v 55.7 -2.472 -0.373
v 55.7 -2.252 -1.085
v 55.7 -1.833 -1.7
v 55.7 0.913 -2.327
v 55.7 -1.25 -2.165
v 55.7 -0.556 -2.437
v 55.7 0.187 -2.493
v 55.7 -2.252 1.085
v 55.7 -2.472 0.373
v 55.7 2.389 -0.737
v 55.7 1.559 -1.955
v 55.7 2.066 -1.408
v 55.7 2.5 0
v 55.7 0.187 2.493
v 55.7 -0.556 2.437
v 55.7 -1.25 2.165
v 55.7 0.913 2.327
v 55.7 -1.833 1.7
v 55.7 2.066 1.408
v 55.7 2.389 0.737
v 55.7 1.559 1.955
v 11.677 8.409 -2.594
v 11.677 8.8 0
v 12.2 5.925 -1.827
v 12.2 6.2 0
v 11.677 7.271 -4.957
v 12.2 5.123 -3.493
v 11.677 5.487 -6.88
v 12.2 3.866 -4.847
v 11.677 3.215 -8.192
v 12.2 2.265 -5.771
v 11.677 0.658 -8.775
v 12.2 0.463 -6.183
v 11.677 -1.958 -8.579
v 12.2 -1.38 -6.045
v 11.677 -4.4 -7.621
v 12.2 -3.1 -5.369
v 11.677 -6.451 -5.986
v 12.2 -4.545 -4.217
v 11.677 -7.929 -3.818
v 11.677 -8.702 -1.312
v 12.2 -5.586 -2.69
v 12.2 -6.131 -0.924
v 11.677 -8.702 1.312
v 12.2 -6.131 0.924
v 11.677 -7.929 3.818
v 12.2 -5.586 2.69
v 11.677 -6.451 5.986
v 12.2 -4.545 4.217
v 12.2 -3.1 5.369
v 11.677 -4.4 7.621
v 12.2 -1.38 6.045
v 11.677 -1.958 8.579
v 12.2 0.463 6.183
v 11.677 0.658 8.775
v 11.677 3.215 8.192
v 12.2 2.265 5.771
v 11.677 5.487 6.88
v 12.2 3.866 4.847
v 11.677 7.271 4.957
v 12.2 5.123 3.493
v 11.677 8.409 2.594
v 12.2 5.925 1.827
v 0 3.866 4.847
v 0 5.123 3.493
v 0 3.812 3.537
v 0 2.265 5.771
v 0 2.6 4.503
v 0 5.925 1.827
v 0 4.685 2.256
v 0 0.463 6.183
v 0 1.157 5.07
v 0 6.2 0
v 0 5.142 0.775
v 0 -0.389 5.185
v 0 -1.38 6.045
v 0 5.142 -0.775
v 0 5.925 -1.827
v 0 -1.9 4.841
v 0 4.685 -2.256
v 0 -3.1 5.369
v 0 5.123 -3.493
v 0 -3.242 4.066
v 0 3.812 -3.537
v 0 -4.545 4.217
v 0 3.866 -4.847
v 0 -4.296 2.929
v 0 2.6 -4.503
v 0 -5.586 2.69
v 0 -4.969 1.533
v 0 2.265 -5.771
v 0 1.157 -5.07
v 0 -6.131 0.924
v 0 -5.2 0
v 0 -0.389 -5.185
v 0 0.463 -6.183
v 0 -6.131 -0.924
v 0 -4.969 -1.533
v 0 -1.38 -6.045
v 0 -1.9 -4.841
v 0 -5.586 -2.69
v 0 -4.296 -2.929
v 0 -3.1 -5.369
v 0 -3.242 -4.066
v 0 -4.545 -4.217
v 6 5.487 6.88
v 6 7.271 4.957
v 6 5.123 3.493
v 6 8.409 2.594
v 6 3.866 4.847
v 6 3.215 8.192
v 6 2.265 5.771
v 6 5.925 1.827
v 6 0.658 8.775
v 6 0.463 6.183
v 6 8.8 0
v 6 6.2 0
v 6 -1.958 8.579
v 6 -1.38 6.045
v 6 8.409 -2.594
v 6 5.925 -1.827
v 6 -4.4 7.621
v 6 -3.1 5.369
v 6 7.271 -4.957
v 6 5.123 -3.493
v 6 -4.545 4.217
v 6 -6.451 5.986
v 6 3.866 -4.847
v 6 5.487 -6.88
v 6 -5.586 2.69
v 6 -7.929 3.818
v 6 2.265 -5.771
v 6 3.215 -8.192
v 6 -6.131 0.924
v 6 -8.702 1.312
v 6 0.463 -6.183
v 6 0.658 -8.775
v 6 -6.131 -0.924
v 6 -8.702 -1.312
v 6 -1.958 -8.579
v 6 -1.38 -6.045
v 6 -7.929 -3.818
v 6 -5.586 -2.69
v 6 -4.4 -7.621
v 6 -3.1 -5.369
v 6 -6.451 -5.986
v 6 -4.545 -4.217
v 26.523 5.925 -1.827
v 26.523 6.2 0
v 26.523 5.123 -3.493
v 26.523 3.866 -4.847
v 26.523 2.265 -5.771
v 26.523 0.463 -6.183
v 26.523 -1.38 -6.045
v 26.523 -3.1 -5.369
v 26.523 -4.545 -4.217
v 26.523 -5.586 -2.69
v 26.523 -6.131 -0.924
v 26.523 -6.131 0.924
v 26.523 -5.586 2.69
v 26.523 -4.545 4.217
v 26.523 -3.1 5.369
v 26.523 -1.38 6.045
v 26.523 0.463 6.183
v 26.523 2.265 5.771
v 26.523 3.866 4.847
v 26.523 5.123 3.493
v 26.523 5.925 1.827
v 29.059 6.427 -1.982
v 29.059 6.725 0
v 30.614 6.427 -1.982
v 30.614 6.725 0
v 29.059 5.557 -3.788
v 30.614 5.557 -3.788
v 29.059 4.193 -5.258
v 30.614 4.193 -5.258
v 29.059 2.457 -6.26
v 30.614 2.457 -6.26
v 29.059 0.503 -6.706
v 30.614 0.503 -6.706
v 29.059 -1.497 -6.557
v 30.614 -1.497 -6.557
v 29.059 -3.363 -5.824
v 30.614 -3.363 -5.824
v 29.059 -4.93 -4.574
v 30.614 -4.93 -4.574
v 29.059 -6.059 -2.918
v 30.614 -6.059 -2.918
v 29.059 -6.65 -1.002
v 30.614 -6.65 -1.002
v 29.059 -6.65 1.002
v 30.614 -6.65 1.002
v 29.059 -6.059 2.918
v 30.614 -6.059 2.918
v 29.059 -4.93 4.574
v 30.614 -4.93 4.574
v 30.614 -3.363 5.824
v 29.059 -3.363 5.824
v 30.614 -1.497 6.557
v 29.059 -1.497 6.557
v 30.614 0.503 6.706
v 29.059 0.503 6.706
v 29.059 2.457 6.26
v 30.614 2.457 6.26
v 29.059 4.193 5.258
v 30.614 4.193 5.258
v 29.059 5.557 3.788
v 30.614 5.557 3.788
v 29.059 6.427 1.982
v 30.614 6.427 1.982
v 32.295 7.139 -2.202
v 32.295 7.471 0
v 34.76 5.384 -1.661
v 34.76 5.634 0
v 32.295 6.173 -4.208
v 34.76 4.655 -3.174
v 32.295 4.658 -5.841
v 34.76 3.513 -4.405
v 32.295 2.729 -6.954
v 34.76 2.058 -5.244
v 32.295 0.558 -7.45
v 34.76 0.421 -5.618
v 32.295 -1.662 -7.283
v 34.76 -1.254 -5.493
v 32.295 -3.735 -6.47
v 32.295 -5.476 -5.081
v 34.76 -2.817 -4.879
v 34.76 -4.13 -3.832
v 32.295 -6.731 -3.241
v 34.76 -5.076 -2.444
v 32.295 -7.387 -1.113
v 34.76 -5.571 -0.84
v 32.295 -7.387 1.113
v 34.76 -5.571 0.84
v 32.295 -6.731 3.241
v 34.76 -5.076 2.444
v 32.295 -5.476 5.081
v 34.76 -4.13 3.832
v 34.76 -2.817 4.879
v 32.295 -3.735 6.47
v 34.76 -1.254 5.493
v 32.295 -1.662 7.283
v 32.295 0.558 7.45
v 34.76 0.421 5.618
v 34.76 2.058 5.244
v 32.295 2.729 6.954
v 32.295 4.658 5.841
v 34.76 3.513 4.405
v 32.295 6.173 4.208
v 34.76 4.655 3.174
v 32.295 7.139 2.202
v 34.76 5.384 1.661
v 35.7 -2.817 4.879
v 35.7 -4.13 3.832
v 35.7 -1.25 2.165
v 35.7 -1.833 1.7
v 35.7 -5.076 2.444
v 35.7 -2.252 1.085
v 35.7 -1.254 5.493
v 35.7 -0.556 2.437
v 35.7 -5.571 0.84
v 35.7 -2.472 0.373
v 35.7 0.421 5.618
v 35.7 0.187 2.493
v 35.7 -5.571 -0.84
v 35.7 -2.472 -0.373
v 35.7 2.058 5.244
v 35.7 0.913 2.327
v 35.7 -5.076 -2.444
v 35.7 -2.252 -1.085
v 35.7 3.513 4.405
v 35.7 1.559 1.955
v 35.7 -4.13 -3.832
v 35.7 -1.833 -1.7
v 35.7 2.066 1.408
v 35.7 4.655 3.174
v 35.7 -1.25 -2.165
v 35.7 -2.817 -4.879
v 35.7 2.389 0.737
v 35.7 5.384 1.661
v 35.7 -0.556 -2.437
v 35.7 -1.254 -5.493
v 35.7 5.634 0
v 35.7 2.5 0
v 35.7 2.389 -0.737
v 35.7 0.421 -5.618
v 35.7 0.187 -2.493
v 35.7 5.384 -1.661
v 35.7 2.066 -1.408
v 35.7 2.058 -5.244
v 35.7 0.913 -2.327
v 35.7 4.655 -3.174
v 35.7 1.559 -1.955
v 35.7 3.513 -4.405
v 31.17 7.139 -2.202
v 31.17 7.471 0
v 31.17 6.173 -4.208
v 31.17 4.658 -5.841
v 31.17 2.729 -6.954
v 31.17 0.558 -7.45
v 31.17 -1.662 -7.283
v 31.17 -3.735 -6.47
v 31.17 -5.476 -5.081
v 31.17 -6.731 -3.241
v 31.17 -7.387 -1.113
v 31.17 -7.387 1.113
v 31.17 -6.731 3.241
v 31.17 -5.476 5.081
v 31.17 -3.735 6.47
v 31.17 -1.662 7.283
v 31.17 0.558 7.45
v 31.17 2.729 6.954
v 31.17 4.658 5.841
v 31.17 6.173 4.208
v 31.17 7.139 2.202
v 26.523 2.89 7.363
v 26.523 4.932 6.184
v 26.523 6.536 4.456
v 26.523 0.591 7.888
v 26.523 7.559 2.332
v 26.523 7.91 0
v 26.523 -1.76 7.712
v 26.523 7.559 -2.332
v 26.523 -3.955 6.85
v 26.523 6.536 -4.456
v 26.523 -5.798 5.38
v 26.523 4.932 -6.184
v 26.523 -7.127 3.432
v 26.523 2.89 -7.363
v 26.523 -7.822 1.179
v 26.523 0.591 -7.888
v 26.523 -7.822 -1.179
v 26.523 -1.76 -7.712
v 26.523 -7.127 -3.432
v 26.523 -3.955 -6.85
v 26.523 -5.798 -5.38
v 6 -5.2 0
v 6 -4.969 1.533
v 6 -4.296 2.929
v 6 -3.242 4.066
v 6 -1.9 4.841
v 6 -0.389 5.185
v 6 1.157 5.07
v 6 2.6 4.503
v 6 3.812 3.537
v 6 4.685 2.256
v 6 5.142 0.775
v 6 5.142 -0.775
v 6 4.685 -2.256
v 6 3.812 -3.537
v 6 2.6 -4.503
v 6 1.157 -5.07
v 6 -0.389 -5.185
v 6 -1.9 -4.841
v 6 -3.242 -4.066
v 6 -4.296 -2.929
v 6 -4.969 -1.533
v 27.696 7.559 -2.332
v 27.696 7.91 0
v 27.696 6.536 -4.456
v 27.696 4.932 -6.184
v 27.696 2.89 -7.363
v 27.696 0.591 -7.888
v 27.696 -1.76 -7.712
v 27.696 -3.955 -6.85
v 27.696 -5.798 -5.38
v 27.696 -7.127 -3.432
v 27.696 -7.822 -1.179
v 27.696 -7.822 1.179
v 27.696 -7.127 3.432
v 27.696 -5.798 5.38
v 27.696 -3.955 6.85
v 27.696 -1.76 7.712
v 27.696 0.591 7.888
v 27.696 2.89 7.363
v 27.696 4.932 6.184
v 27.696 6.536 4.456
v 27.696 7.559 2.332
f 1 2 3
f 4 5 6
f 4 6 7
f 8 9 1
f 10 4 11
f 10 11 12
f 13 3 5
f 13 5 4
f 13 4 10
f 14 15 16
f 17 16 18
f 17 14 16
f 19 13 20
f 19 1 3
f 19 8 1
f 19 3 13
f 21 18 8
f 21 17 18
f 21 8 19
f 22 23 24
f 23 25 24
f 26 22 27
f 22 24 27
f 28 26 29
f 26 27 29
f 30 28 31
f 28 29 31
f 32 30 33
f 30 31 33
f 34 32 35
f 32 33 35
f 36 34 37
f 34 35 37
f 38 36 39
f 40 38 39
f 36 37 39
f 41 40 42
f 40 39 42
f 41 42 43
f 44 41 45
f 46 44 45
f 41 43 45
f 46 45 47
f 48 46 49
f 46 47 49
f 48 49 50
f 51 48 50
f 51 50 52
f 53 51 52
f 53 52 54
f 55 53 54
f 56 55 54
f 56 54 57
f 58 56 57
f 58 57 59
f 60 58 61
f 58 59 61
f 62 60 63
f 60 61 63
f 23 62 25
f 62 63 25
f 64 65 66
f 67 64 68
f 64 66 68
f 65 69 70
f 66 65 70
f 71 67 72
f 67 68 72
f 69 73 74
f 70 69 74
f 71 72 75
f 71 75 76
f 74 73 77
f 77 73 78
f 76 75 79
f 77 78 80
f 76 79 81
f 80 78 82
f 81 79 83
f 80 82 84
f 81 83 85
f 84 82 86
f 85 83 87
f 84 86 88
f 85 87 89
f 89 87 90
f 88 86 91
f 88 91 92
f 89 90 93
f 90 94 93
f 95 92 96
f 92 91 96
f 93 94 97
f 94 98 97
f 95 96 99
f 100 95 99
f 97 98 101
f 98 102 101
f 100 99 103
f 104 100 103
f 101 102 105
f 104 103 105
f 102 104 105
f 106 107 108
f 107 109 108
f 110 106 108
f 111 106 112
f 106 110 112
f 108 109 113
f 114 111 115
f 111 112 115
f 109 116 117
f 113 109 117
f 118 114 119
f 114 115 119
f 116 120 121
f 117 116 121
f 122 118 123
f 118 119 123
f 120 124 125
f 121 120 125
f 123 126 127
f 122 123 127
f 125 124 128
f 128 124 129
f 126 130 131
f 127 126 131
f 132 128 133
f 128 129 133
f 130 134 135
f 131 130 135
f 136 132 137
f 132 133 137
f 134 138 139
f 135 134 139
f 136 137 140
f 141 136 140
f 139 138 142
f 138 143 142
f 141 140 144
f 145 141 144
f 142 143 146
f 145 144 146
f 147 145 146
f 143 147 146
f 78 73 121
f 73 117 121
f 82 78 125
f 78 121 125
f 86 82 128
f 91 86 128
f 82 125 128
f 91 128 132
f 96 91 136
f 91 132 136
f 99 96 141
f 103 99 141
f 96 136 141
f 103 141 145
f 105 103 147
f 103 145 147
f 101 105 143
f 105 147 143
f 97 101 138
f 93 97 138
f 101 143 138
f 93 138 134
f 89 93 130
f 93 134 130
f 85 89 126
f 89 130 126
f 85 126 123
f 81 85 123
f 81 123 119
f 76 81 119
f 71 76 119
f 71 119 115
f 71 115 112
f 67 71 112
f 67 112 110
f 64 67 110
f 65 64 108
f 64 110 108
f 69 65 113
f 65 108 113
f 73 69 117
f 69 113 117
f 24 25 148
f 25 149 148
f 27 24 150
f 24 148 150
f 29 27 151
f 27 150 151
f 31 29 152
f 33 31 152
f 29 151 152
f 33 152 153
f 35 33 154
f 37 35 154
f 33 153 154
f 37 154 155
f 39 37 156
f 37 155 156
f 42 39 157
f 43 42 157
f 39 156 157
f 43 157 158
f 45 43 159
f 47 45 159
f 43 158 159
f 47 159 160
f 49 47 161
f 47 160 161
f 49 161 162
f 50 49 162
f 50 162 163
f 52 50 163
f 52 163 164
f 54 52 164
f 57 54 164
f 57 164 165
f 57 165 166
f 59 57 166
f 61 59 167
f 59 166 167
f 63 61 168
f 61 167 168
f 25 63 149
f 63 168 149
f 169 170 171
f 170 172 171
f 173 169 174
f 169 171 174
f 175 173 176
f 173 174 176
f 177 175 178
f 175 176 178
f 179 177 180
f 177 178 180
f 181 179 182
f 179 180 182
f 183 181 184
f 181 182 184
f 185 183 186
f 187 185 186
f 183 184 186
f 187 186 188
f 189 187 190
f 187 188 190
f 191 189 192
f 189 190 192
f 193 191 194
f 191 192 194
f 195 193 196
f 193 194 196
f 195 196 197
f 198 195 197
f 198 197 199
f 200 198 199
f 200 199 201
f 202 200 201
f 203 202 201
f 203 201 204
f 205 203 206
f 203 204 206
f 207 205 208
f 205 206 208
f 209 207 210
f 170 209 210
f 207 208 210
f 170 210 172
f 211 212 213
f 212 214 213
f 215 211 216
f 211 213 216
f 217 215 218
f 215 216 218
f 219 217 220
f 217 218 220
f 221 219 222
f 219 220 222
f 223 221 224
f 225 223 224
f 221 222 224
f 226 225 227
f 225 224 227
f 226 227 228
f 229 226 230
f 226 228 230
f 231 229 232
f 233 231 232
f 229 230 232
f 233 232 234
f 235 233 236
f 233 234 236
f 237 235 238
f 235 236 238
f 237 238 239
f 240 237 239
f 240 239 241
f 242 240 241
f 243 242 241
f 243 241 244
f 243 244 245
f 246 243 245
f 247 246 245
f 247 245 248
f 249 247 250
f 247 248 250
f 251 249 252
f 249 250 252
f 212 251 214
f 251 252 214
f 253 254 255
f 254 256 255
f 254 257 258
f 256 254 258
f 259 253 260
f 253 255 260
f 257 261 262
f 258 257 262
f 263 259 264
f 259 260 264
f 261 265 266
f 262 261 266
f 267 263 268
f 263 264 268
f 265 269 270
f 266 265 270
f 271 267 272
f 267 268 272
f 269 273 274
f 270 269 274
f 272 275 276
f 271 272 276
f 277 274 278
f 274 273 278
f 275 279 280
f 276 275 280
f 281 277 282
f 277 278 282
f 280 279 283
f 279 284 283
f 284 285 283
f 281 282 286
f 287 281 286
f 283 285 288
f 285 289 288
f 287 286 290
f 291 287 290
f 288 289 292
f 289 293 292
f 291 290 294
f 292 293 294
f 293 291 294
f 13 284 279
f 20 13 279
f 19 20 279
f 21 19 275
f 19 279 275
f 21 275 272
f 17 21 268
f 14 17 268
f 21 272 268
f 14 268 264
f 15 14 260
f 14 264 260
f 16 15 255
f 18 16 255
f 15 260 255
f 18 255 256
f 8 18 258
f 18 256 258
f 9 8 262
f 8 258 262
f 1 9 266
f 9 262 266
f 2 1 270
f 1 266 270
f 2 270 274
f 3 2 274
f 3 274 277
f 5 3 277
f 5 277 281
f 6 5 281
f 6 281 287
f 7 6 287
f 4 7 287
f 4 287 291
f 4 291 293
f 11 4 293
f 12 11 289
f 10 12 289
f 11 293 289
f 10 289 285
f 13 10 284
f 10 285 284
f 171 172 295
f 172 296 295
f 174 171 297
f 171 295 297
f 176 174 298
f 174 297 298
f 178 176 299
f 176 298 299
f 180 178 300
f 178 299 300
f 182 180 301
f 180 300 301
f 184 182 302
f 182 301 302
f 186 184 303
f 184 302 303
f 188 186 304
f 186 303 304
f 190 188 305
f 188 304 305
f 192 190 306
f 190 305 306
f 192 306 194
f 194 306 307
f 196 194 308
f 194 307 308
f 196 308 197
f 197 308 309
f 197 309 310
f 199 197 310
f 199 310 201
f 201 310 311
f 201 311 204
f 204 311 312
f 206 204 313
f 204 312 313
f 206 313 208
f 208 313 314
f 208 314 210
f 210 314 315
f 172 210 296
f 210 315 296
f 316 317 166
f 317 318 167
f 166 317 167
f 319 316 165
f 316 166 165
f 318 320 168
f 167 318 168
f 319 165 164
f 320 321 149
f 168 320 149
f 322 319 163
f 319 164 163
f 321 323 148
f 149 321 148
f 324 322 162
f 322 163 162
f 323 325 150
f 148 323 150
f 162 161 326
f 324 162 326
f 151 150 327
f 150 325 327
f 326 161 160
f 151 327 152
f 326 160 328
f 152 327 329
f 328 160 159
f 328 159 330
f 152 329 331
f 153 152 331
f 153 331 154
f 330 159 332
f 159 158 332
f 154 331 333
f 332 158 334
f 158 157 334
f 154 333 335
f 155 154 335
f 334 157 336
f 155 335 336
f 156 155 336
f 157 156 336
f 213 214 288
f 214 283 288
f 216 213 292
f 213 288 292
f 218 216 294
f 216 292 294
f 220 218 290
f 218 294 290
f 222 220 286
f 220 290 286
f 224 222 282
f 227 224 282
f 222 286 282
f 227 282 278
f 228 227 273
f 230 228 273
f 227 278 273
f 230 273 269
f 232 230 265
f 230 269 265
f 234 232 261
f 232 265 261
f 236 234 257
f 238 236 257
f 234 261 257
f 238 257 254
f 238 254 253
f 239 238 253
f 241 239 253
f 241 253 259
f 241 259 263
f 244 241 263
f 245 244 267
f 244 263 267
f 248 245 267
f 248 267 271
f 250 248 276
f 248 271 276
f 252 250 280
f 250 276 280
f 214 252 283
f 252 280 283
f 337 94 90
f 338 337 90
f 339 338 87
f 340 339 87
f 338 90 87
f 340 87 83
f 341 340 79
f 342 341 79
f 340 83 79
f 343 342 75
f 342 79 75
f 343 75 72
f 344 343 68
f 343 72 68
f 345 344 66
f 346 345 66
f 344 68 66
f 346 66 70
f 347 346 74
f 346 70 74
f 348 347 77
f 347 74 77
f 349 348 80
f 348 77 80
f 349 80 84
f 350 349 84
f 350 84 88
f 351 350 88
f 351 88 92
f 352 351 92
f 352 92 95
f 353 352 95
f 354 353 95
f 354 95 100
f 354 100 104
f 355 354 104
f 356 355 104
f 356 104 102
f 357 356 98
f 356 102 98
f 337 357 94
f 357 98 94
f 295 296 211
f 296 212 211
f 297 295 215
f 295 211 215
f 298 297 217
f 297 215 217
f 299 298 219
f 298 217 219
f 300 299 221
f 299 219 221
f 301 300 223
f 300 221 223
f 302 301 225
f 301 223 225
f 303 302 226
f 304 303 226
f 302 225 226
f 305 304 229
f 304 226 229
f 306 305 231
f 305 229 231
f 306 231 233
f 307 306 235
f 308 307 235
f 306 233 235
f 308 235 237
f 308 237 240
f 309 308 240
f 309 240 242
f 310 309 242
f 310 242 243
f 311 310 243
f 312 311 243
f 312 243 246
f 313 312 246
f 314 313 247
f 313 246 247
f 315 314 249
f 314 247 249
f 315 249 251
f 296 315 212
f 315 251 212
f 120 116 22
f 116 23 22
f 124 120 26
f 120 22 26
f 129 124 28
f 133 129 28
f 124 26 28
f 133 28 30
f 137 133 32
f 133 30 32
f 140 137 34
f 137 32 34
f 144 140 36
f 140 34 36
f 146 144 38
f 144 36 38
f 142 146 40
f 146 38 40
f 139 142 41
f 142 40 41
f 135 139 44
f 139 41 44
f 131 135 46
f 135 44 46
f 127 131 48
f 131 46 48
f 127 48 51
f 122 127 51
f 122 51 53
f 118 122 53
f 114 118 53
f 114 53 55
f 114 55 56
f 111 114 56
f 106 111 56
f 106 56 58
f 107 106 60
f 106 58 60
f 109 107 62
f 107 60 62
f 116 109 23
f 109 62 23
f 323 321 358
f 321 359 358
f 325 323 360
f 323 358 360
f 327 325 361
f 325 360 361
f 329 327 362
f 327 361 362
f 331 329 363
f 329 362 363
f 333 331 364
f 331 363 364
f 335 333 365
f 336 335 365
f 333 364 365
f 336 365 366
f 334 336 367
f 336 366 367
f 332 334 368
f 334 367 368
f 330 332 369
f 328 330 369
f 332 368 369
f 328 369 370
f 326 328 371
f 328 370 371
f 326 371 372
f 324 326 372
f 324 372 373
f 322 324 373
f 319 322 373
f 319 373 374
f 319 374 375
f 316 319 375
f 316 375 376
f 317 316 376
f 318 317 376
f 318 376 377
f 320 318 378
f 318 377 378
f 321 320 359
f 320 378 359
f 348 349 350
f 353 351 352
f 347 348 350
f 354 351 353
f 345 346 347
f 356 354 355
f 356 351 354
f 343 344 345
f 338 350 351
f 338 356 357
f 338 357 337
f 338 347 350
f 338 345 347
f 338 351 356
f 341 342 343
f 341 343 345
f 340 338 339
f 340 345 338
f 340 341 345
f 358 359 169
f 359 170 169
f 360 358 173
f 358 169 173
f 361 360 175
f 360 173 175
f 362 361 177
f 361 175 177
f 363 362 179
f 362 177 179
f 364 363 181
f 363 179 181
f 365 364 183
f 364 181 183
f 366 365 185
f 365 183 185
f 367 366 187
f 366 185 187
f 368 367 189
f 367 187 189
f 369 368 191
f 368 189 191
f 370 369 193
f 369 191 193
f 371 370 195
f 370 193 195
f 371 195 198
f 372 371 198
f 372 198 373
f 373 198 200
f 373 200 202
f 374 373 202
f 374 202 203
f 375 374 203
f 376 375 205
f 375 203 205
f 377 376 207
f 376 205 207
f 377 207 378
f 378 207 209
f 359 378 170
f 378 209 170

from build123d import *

# Parameters (mm, degrees)
SKETCH_2_R          = 5.2
CUT_EXTRUDE_1_DEPTH = 6
SKETCH_3_R          = 2.5
EXTRUDE_1_DEPTH     = 20


with BuildPart() as part:
    # 草图1 → 旋转1 (revolve)
    with BuildSketch(Plane.XY):
        Polygon((0, 0), (0, 6.2), (6, 6.2), (6, 8.8), (11.676949671, 8.8), (12.2, 6.2), (26.523039375, 6.2), (26.523039375, 7.91006879), (27.695766684, 7.91006879), (29.059190298, 6.725292283), (30.614076117, 6.725292283), (31.1695333, 7.470731504), (32.294644919, 7.470731504), (34.759713658, 5.633908195), (35.7, 5.633908195), (35.7, 0), align=None)
    revolve(axis=Axis((35.7, 0, 0), (-1, 0, 0)))

    # 草图2 → 切除-拉伸1 (cut)
    with BuildSketch(Plane.ZY):
        with Locations(Location((0, 0, 0), (0, 0, 270))):
            Circle(SKETCH_2_R)
    extrude(amount=-CUT_EXTRUDE_1_DEPTH, mode=Mode.SUBTRACT)

    # 草图3 → 凸台-拉伸1 (add)
    with BuildSketch(Plane(origin=(35.7, 0, 0), x_dir=(0, 0, -1), z_dir=(1, 0, 0))):
        with Locations(Location((0, 0, 0), (0, 0, 90))):
            Circle(SKETCH_3_R)
    extrude(amount=EXTRUDE_1_DEPTH)


solid = part.part
